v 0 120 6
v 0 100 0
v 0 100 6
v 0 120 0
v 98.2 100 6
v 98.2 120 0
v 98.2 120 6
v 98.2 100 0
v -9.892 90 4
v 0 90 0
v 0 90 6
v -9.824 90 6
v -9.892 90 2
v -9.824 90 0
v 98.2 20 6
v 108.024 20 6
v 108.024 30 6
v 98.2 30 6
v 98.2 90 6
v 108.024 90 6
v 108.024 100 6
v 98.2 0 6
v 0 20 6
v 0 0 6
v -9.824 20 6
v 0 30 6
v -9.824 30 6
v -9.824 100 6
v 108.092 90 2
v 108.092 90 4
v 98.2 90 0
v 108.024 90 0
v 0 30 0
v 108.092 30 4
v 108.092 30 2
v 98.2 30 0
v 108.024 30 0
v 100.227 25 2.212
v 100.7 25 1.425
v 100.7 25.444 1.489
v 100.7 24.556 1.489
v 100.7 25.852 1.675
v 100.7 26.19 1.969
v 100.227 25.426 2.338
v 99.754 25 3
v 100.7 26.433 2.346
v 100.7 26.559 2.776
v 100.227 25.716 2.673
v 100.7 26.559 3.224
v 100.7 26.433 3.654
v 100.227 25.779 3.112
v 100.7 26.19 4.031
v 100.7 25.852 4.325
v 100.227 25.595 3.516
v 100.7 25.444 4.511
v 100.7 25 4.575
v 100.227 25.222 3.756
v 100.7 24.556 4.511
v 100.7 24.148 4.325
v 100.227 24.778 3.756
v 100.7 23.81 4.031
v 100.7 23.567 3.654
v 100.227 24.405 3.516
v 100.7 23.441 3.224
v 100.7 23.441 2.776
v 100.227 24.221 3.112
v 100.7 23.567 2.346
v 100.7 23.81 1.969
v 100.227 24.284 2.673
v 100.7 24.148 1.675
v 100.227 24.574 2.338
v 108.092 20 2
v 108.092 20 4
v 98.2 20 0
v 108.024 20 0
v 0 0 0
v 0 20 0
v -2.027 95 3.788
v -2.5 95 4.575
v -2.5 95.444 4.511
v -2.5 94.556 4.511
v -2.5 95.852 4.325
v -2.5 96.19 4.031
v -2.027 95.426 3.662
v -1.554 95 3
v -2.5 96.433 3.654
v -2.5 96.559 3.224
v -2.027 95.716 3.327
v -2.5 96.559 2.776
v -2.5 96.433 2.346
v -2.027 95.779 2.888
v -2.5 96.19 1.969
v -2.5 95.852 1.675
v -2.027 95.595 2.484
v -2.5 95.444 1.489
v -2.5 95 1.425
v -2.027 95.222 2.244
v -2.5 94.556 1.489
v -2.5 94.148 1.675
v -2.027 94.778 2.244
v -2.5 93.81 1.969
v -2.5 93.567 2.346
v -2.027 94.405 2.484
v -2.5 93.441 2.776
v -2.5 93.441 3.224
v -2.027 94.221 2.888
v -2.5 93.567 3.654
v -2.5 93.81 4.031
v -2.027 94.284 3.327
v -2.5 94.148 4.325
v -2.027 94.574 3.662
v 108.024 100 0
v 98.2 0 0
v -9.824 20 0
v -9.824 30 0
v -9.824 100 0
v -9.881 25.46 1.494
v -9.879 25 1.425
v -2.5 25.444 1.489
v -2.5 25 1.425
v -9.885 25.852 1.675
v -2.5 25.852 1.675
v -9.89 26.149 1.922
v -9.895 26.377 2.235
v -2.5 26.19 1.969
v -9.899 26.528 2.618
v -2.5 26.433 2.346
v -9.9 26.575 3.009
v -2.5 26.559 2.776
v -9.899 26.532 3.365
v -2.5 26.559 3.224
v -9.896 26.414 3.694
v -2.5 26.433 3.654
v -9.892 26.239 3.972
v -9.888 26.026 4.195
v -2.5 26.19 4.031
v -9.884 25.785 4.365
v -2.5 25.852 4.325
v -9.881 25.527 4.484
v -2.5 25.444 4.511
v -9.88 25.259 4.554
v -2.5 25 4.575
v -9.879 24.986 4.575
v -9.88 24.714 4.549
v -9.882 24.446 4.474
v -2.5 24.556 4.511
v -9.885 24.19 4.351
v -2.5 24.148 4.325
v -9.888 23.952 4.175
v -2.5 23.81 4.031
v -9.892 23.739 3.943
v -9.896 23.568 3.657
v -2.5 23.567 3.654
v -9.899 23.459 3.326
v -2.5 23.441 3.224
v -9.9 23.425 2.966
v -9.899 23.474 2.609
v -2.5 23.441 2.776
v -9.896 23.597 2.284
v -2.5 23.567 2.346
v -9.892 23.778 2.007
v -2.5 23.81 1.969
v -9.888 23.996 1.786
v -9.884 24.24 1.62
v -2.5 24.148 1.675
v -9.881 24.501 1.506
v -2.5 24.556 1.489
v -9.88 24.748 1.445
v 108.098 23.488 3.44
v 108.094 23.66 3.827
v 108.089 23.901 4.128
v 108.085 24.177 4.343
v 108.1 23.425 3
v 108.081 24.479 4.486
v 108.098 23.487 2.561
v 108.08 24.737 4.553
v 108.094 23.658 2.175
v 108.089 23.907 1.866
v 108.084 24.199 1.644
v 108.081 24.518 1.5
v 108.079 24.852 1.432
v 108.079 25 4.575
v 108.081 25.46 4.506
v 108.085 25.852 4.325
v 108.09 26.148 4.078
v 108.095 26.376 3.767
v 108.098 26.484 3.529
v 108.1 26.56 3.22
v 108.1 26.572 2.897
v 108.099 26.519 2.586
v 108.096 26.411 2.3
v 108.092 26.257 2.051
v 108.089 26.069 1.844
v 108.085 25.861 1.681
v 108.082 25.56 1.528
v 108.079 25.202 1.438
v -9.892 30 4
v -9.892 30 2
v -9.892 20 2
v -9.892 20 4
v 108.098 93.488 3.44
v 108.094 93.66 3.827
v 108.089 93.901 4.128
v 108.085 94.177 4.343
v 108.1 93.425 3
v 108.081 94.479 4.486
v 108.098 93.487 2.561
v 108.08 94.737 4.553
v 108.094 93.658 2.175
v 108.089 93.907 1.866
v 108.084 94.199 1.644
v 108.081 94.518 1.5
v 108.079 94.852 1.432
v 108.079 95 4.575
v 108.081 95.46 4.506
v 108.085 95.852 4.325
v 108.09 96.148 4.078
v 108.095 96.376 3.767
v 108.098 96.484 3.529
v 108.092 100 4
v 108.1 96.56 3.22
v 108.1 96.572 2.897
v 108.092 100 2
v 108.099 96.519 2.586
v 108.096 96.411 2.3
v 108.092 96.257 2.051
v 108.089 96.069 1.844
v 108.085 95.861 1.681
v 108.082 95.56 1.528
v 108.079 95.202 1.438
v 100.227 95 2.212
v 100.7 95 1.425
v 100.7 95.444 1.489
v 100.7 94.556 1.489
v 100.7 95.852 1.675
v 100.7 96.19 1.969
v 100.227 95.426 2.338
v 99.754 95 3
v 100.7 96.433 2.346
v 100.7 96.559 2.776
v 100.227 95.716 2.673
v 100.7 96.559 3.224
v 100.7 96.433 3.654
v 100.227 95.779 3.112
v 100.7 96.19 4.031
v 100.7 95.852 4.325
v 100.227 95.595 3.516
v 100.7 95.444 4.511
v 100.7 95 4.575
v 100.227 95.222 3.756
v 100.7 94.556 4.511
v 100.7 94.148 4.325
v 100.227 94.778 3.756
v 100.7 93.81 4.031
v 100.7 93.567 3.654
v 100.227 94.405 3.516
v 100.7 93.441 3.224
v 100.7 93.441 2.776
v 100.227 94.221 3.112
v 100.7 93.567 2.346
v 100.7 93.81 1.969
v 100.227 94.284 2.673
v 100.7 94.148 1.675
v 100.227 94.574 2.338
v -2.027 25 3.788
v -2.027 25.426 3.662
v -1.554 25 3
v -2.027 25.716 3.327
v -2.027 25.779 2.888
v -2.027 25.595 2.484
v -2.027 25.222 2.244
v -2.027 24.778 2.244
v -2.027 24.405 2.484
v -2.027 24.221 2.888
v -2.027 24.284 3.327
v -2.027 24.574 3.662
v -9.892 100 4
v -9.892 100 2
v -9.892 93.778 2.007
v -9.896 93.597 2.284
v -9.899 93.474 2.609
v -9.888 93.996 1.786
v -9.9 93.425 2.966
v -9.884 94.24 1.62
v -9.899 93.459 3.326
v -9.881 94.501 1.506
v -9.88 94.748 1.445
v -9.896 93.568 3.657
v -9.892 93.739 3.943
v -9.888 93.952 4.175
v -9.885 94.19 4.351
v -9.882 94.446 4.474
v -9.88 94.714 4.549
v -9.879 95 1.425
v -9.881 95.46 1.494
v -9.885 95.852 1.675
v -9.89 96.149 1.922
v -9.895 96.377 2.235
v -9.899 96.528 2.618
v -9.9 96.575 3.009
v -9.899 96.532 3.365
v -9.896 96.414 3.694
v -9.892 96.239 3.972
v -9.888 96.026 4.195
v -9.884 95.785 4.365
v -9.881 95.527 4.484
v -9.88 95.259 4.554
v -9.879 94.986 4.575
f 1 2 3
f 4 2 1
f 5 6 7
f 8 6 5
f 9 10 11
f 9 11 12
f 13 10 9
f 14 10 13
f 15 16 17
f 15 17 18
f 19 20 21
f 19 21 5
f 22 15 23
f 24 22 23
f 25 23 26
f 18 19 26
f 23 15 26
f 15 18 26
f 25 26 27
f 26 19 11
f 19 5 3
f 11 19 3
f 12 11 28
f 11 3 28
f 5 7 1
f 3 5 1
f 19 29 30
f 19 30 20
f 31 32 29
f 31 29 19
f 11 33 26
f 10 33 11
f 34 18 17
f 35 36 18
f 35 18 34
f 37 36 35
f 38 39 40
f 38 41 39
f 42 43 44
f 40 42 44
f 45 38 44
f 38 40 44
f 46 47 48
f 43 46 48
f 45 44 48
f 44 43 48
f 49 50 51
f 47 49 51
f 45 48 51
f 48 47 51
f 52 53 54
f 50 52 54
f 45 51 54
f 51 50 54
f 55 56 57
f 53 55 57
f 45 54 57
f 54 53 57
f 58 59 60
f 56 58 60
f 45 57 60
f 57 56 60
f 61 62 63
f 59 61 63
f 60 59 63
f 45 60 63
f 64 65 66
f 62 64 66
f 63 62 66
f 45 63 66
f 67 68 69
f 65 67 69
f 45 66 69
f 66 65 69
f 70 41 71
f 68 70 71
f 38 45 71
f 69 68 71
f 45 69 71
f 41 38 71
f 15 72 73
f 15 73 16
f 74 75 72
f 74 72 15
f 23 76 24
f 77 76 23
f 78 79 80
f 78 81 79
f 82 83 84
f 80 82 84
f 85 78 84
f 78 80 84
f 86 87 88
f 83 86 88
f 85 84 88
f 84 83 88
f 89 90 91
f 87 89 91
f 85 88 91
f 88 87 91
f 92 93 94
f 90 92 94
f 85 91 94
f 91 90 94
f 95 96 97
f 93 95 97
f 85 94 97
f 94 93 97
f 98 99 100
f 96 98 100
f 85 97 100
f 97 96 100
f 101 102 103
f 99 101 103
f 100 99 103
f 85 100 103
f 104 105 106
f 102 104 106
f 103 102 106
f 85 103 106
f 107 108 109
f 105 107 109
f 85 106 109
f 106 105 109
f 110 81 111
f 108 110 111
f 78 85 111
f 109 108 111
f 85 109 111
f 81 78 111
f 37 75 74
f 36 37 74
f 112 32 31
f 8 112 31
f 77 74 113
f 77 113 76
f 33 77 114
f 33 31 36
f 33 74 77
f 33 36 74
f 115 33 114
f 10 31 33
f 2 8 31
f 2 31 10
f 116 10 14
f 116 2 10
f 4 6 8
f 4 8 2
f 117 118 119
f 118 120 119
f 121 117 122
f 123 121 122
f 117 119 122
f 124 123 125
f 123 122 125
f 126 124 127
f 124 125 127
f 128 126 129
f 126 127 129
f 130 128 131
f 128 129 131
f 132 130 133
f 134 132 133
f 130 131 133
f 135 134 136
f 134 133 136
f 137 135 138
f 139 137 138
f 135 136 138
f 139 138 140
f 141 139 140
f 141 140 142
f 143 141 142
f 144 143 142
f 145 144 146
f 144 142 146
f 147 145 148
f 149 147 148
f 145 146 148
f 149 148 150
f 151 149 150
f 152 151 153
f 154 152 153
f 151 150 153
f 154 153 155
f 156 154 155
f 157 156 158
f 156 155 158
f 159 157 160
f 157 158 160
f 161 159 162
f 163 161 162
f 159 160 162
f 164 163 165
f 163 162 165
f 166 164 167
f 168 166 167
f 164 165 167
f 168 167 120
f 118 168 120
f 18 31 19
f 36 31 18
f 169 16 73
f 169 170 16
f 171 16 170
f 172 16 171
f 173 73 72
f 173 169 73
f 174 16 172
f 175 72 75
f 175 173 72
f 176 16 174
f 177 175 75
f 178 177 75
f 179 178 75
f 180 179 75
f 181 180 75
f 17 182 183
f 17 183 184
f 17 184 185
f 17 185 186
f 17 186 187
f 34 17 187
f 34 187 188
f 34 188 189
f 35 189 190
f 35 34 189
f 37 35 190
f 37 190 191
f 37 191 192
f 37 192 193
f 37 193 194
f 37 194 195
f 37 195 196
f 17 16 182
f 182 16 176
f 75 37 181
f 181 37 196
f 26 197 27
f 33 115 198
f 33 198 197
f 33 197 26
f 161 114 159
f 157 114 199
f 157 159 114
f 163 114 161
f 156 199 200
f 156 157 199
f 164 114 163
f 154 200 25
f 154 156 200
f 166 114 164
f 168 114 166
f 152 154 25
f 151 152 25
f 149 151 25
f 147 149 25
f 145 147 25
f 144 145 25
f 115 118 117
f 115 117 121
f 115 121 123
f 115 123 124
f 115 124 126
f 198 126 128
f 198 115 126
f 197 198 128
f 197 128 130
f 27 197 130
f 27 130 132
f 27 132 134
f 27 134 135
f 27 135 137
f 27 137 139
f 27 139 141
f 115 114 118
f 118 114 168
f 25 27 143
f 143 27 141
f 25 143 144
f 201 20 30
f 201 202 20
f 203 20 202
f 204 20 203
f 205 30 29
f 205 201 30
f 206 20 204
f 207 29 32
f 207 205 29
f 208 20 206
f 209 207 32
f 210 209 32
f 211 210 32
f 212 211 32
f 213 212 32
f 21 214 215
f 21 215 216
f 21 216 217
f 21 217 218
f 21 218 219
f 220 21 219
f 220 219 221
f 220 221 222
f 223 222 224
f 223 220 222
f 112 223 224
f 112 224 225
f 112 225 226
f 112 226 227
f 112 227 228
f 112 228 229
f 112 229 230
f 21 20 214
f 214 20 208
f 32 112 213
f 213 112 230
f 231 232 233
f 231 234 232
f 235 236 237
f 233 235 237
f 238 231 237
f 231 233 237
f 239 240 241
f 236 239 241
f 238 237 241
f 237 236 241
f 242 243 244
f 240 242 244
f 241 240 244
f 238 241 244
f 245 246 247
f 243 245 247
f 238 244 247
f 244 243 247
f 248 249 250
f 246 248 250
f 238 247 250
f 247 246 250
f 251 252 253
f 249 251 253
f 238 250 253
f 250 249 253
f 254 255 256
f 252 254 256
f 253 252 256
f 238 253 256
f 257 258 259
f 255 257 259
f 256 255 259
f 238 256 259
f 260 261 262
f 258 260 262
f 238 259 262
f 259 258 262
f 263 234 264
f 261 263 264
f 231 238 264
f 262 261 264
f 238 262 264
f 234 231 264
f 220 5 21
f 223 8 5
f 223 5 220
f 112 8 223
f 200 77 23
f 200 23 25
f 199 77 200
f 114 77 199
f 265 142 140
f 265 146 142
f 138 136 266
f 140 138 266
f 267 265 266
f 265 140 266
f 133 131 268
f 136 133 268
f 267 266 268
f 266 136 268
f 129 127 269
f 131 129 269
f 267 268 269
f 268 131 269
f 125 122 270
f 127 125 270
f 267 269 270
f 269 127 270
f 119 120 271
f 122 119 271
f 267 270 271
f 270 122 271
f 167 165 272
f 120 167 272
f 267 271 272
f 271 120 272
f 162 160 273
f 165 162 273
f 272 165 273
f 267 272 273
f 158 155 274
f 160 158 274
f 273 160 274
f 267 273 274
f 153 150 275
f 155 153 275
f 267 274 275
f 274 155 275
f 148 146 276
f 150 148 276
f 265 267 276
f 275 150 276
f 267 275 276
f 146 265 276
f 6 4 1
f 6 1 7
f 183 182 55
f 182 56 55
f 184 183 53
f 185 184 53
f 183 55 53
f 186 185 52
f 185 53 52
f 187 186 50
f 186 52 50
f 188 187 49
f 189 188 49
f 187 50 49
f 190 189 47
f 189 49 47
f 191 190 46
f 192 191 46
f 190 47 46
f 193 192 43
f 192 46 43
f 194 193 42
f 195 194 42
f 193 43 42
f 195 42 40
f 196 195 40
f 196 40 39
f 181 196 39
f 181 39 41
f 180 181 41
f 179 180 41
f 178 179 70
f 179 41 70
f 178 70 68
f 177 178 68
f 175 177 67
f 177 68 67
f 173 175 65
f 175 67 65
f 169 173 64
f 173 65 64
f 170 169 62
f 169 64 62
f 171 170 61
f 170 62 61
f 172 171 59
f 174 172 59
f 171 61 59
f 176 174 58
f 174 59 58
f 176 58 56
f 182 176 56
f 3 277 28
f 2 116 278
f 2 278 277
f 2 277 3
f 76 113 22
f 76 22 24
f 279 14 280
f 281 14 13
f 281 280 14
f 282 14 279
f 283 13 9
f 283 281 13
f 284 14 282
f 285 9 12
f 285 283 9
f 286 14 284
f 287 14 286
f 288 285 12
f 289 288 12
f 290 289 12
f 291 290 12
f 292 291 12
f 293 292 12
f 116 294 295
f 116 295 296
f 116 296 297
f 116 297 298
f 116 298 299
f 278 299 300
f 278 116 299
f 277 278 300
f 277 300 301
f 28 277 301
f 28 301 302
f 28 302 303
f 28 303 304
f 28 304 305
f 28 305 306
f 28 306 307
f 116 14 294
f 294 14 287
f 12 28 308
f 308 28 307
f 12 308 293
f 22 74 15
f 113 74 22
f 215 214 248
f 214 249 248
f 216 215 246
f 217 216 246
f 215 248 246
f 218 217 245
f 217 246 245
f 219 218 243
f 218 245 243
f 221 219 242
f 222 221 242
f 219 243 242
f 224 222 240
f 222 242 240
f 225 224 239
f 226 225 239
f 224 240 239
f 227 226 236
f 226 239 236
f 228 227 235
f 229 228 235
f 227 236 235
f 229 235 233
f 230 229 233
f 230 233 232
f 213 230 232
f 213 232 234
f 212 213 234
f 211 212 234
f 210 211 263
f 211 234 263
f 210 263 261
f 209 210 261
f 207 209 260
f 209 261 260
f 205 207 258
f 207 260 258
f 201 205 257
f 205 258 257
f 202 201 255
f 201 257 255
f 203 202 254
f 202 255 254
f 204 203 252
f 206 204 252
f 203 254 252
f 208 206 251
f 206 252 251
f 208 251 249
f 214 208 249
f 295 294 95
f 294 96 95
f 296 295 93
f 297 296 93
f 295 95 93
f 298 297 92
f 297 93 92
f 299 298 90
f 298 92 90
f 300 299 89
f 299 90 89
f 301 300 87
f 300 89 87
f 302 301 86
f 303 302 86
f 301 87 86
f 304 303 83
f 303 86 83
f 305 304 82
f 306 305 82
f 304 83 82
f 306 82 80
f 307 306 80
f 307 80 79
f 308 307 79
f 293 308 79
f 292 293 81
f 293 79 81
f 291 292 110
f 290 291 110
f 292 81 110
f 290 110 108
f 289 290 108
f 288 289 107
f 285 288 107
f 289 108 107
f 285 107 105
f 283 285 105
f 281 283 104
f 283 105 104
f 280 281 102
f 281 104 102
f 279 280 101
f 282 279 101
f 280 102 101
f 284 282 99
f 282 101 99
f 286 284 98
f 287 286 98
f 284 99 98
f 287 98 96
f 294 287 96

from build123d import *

# Parameters (mm, degrees)
Y_KSEKLIK_EKSTR_ZYON1_DEPTH             = 6
M3X0_5_HELISARMAL_IN_DI_LI_DELIK1_D     = 3.15
M3X0_5_HELISARMAL_IN_DI_LI_DELIK1_DEPTH = 7.5
M3X0_5_HELISARMAL_IN_DI_LI_DELIK1_TIP   = 0.946355475
M3X0_5_HELISARMAL_IN_DI_LI_DELIK2_D     = 3.15
M3X0_5_HELISARMAL_IN_DI_LI_DELIK2_DEPTH = 7.5
M3X0_5_HELISARMAL_IN_DI_LI_DELIK2_TIP   = 0.946355475
IZIM2_R                                 = 69
IZIM2_R_2                               = 59
KES_EKSTR_ZYON_NCE1_DEPTH               = 150


with BuildPart() as part:
    # Çizim1 → Yükseklik-Ekstrüzyon1 (new body)
    with BuildSketch(Plane.XY):
        Polygon((0, 20), (-10, 20), (-10, 30), (0, 30), (0, 90), (-10, 90), (-10, 100), (0, 100), (0, 120), (98.2, 120), (98.2, 100), (108.2, 100), (108.2, 90), (98.2, 90), (98.2, 30), (108.2, 30), (108.2, 20), (98.2, 20), (98.2, 0), (0, 0), align=None)
    extrude(amount=Y_KSEKLIK_EKSTR_ZYON1_DEPTH)

    # M3x0.5 Helisarmal İçin Dişli Delik1
    with Locations(Plane.ZY.offset(10)):
        with Locations((3, 25), (3, 95)):
            Hole(M3X0_5_HELISARMAL_IN_DI_LI_DELIK1_D / 2, depth=M3X0_5_HELISARMAL_IN_DI_LI_DELIK1_DEPTH)
            with Locations((0, 0, -(M3X0_5_HELISARMAL_IN_DI_LI_DELIK1_DEPTH + M3X0_5_HELISARMAL_IN_DI_LI_DELIK1_TIP / 2))):  # 118° drill point
                Cone(0, M3X0_5_HELISARMAL_IN_DI_LI_DELIK1_D / 2, M3X0_5_HELISARMAL_IN_DI_LI_DELIK1_TIP, mode=Mode.SUBTRACT)

    # M3x0.5 Helisarmal İçin Dişli Delik2
    with Locations(Plane(origin=(108.2, 0, 0), x_dir=(0, 0, -1), z_dir=(1, 0, 0))):
        with Locations((-3, 25), (-3, 95)):
            Hole(M3X0_5_HELISARMAL_IN_DI_LI_DELIK2_D / 2, depth=M3X0_5_HELISARMAL_IN_DI_LI_DELIK2_DEPTH)
            with Locations((0, 0, -(M3X0_5_HELISARMAL_IN_DI_LI_DELIK2_DEPTH + M3X0_5_HELISARMAL_IN_DI_LI_DELIK2_TIP / 2))):  # 118° drill point
                Cone(0, M3X0_5_HELISARMAL_IN_DI_LI_DELIK2_D / 2, M3X0_5_HELISARMAL_IN_DI_LI_DELIK2_TIP, mode=Mode.SUBTRACT)

    # Çizim2 → Kes-Ekstrüzyon-İnce1 (cut)
    with BuildSketch(Plane(origin=(0, 120, 0), x_dir=(1, 0, 0), z_dir=(0, 1, 0))):
        with Locations((49.1, -3)):
            Circle(IZIM2_R)
        with Locations((49.1, -3)):
            Circle(IZIM2_R_2, mode=Mode.SUBTRACT)
    extrude(amount=-KES_EKSTR_ZYON_NCE1_DEPTH, mode=Mode.SUBTRACT)


solid = part.part
